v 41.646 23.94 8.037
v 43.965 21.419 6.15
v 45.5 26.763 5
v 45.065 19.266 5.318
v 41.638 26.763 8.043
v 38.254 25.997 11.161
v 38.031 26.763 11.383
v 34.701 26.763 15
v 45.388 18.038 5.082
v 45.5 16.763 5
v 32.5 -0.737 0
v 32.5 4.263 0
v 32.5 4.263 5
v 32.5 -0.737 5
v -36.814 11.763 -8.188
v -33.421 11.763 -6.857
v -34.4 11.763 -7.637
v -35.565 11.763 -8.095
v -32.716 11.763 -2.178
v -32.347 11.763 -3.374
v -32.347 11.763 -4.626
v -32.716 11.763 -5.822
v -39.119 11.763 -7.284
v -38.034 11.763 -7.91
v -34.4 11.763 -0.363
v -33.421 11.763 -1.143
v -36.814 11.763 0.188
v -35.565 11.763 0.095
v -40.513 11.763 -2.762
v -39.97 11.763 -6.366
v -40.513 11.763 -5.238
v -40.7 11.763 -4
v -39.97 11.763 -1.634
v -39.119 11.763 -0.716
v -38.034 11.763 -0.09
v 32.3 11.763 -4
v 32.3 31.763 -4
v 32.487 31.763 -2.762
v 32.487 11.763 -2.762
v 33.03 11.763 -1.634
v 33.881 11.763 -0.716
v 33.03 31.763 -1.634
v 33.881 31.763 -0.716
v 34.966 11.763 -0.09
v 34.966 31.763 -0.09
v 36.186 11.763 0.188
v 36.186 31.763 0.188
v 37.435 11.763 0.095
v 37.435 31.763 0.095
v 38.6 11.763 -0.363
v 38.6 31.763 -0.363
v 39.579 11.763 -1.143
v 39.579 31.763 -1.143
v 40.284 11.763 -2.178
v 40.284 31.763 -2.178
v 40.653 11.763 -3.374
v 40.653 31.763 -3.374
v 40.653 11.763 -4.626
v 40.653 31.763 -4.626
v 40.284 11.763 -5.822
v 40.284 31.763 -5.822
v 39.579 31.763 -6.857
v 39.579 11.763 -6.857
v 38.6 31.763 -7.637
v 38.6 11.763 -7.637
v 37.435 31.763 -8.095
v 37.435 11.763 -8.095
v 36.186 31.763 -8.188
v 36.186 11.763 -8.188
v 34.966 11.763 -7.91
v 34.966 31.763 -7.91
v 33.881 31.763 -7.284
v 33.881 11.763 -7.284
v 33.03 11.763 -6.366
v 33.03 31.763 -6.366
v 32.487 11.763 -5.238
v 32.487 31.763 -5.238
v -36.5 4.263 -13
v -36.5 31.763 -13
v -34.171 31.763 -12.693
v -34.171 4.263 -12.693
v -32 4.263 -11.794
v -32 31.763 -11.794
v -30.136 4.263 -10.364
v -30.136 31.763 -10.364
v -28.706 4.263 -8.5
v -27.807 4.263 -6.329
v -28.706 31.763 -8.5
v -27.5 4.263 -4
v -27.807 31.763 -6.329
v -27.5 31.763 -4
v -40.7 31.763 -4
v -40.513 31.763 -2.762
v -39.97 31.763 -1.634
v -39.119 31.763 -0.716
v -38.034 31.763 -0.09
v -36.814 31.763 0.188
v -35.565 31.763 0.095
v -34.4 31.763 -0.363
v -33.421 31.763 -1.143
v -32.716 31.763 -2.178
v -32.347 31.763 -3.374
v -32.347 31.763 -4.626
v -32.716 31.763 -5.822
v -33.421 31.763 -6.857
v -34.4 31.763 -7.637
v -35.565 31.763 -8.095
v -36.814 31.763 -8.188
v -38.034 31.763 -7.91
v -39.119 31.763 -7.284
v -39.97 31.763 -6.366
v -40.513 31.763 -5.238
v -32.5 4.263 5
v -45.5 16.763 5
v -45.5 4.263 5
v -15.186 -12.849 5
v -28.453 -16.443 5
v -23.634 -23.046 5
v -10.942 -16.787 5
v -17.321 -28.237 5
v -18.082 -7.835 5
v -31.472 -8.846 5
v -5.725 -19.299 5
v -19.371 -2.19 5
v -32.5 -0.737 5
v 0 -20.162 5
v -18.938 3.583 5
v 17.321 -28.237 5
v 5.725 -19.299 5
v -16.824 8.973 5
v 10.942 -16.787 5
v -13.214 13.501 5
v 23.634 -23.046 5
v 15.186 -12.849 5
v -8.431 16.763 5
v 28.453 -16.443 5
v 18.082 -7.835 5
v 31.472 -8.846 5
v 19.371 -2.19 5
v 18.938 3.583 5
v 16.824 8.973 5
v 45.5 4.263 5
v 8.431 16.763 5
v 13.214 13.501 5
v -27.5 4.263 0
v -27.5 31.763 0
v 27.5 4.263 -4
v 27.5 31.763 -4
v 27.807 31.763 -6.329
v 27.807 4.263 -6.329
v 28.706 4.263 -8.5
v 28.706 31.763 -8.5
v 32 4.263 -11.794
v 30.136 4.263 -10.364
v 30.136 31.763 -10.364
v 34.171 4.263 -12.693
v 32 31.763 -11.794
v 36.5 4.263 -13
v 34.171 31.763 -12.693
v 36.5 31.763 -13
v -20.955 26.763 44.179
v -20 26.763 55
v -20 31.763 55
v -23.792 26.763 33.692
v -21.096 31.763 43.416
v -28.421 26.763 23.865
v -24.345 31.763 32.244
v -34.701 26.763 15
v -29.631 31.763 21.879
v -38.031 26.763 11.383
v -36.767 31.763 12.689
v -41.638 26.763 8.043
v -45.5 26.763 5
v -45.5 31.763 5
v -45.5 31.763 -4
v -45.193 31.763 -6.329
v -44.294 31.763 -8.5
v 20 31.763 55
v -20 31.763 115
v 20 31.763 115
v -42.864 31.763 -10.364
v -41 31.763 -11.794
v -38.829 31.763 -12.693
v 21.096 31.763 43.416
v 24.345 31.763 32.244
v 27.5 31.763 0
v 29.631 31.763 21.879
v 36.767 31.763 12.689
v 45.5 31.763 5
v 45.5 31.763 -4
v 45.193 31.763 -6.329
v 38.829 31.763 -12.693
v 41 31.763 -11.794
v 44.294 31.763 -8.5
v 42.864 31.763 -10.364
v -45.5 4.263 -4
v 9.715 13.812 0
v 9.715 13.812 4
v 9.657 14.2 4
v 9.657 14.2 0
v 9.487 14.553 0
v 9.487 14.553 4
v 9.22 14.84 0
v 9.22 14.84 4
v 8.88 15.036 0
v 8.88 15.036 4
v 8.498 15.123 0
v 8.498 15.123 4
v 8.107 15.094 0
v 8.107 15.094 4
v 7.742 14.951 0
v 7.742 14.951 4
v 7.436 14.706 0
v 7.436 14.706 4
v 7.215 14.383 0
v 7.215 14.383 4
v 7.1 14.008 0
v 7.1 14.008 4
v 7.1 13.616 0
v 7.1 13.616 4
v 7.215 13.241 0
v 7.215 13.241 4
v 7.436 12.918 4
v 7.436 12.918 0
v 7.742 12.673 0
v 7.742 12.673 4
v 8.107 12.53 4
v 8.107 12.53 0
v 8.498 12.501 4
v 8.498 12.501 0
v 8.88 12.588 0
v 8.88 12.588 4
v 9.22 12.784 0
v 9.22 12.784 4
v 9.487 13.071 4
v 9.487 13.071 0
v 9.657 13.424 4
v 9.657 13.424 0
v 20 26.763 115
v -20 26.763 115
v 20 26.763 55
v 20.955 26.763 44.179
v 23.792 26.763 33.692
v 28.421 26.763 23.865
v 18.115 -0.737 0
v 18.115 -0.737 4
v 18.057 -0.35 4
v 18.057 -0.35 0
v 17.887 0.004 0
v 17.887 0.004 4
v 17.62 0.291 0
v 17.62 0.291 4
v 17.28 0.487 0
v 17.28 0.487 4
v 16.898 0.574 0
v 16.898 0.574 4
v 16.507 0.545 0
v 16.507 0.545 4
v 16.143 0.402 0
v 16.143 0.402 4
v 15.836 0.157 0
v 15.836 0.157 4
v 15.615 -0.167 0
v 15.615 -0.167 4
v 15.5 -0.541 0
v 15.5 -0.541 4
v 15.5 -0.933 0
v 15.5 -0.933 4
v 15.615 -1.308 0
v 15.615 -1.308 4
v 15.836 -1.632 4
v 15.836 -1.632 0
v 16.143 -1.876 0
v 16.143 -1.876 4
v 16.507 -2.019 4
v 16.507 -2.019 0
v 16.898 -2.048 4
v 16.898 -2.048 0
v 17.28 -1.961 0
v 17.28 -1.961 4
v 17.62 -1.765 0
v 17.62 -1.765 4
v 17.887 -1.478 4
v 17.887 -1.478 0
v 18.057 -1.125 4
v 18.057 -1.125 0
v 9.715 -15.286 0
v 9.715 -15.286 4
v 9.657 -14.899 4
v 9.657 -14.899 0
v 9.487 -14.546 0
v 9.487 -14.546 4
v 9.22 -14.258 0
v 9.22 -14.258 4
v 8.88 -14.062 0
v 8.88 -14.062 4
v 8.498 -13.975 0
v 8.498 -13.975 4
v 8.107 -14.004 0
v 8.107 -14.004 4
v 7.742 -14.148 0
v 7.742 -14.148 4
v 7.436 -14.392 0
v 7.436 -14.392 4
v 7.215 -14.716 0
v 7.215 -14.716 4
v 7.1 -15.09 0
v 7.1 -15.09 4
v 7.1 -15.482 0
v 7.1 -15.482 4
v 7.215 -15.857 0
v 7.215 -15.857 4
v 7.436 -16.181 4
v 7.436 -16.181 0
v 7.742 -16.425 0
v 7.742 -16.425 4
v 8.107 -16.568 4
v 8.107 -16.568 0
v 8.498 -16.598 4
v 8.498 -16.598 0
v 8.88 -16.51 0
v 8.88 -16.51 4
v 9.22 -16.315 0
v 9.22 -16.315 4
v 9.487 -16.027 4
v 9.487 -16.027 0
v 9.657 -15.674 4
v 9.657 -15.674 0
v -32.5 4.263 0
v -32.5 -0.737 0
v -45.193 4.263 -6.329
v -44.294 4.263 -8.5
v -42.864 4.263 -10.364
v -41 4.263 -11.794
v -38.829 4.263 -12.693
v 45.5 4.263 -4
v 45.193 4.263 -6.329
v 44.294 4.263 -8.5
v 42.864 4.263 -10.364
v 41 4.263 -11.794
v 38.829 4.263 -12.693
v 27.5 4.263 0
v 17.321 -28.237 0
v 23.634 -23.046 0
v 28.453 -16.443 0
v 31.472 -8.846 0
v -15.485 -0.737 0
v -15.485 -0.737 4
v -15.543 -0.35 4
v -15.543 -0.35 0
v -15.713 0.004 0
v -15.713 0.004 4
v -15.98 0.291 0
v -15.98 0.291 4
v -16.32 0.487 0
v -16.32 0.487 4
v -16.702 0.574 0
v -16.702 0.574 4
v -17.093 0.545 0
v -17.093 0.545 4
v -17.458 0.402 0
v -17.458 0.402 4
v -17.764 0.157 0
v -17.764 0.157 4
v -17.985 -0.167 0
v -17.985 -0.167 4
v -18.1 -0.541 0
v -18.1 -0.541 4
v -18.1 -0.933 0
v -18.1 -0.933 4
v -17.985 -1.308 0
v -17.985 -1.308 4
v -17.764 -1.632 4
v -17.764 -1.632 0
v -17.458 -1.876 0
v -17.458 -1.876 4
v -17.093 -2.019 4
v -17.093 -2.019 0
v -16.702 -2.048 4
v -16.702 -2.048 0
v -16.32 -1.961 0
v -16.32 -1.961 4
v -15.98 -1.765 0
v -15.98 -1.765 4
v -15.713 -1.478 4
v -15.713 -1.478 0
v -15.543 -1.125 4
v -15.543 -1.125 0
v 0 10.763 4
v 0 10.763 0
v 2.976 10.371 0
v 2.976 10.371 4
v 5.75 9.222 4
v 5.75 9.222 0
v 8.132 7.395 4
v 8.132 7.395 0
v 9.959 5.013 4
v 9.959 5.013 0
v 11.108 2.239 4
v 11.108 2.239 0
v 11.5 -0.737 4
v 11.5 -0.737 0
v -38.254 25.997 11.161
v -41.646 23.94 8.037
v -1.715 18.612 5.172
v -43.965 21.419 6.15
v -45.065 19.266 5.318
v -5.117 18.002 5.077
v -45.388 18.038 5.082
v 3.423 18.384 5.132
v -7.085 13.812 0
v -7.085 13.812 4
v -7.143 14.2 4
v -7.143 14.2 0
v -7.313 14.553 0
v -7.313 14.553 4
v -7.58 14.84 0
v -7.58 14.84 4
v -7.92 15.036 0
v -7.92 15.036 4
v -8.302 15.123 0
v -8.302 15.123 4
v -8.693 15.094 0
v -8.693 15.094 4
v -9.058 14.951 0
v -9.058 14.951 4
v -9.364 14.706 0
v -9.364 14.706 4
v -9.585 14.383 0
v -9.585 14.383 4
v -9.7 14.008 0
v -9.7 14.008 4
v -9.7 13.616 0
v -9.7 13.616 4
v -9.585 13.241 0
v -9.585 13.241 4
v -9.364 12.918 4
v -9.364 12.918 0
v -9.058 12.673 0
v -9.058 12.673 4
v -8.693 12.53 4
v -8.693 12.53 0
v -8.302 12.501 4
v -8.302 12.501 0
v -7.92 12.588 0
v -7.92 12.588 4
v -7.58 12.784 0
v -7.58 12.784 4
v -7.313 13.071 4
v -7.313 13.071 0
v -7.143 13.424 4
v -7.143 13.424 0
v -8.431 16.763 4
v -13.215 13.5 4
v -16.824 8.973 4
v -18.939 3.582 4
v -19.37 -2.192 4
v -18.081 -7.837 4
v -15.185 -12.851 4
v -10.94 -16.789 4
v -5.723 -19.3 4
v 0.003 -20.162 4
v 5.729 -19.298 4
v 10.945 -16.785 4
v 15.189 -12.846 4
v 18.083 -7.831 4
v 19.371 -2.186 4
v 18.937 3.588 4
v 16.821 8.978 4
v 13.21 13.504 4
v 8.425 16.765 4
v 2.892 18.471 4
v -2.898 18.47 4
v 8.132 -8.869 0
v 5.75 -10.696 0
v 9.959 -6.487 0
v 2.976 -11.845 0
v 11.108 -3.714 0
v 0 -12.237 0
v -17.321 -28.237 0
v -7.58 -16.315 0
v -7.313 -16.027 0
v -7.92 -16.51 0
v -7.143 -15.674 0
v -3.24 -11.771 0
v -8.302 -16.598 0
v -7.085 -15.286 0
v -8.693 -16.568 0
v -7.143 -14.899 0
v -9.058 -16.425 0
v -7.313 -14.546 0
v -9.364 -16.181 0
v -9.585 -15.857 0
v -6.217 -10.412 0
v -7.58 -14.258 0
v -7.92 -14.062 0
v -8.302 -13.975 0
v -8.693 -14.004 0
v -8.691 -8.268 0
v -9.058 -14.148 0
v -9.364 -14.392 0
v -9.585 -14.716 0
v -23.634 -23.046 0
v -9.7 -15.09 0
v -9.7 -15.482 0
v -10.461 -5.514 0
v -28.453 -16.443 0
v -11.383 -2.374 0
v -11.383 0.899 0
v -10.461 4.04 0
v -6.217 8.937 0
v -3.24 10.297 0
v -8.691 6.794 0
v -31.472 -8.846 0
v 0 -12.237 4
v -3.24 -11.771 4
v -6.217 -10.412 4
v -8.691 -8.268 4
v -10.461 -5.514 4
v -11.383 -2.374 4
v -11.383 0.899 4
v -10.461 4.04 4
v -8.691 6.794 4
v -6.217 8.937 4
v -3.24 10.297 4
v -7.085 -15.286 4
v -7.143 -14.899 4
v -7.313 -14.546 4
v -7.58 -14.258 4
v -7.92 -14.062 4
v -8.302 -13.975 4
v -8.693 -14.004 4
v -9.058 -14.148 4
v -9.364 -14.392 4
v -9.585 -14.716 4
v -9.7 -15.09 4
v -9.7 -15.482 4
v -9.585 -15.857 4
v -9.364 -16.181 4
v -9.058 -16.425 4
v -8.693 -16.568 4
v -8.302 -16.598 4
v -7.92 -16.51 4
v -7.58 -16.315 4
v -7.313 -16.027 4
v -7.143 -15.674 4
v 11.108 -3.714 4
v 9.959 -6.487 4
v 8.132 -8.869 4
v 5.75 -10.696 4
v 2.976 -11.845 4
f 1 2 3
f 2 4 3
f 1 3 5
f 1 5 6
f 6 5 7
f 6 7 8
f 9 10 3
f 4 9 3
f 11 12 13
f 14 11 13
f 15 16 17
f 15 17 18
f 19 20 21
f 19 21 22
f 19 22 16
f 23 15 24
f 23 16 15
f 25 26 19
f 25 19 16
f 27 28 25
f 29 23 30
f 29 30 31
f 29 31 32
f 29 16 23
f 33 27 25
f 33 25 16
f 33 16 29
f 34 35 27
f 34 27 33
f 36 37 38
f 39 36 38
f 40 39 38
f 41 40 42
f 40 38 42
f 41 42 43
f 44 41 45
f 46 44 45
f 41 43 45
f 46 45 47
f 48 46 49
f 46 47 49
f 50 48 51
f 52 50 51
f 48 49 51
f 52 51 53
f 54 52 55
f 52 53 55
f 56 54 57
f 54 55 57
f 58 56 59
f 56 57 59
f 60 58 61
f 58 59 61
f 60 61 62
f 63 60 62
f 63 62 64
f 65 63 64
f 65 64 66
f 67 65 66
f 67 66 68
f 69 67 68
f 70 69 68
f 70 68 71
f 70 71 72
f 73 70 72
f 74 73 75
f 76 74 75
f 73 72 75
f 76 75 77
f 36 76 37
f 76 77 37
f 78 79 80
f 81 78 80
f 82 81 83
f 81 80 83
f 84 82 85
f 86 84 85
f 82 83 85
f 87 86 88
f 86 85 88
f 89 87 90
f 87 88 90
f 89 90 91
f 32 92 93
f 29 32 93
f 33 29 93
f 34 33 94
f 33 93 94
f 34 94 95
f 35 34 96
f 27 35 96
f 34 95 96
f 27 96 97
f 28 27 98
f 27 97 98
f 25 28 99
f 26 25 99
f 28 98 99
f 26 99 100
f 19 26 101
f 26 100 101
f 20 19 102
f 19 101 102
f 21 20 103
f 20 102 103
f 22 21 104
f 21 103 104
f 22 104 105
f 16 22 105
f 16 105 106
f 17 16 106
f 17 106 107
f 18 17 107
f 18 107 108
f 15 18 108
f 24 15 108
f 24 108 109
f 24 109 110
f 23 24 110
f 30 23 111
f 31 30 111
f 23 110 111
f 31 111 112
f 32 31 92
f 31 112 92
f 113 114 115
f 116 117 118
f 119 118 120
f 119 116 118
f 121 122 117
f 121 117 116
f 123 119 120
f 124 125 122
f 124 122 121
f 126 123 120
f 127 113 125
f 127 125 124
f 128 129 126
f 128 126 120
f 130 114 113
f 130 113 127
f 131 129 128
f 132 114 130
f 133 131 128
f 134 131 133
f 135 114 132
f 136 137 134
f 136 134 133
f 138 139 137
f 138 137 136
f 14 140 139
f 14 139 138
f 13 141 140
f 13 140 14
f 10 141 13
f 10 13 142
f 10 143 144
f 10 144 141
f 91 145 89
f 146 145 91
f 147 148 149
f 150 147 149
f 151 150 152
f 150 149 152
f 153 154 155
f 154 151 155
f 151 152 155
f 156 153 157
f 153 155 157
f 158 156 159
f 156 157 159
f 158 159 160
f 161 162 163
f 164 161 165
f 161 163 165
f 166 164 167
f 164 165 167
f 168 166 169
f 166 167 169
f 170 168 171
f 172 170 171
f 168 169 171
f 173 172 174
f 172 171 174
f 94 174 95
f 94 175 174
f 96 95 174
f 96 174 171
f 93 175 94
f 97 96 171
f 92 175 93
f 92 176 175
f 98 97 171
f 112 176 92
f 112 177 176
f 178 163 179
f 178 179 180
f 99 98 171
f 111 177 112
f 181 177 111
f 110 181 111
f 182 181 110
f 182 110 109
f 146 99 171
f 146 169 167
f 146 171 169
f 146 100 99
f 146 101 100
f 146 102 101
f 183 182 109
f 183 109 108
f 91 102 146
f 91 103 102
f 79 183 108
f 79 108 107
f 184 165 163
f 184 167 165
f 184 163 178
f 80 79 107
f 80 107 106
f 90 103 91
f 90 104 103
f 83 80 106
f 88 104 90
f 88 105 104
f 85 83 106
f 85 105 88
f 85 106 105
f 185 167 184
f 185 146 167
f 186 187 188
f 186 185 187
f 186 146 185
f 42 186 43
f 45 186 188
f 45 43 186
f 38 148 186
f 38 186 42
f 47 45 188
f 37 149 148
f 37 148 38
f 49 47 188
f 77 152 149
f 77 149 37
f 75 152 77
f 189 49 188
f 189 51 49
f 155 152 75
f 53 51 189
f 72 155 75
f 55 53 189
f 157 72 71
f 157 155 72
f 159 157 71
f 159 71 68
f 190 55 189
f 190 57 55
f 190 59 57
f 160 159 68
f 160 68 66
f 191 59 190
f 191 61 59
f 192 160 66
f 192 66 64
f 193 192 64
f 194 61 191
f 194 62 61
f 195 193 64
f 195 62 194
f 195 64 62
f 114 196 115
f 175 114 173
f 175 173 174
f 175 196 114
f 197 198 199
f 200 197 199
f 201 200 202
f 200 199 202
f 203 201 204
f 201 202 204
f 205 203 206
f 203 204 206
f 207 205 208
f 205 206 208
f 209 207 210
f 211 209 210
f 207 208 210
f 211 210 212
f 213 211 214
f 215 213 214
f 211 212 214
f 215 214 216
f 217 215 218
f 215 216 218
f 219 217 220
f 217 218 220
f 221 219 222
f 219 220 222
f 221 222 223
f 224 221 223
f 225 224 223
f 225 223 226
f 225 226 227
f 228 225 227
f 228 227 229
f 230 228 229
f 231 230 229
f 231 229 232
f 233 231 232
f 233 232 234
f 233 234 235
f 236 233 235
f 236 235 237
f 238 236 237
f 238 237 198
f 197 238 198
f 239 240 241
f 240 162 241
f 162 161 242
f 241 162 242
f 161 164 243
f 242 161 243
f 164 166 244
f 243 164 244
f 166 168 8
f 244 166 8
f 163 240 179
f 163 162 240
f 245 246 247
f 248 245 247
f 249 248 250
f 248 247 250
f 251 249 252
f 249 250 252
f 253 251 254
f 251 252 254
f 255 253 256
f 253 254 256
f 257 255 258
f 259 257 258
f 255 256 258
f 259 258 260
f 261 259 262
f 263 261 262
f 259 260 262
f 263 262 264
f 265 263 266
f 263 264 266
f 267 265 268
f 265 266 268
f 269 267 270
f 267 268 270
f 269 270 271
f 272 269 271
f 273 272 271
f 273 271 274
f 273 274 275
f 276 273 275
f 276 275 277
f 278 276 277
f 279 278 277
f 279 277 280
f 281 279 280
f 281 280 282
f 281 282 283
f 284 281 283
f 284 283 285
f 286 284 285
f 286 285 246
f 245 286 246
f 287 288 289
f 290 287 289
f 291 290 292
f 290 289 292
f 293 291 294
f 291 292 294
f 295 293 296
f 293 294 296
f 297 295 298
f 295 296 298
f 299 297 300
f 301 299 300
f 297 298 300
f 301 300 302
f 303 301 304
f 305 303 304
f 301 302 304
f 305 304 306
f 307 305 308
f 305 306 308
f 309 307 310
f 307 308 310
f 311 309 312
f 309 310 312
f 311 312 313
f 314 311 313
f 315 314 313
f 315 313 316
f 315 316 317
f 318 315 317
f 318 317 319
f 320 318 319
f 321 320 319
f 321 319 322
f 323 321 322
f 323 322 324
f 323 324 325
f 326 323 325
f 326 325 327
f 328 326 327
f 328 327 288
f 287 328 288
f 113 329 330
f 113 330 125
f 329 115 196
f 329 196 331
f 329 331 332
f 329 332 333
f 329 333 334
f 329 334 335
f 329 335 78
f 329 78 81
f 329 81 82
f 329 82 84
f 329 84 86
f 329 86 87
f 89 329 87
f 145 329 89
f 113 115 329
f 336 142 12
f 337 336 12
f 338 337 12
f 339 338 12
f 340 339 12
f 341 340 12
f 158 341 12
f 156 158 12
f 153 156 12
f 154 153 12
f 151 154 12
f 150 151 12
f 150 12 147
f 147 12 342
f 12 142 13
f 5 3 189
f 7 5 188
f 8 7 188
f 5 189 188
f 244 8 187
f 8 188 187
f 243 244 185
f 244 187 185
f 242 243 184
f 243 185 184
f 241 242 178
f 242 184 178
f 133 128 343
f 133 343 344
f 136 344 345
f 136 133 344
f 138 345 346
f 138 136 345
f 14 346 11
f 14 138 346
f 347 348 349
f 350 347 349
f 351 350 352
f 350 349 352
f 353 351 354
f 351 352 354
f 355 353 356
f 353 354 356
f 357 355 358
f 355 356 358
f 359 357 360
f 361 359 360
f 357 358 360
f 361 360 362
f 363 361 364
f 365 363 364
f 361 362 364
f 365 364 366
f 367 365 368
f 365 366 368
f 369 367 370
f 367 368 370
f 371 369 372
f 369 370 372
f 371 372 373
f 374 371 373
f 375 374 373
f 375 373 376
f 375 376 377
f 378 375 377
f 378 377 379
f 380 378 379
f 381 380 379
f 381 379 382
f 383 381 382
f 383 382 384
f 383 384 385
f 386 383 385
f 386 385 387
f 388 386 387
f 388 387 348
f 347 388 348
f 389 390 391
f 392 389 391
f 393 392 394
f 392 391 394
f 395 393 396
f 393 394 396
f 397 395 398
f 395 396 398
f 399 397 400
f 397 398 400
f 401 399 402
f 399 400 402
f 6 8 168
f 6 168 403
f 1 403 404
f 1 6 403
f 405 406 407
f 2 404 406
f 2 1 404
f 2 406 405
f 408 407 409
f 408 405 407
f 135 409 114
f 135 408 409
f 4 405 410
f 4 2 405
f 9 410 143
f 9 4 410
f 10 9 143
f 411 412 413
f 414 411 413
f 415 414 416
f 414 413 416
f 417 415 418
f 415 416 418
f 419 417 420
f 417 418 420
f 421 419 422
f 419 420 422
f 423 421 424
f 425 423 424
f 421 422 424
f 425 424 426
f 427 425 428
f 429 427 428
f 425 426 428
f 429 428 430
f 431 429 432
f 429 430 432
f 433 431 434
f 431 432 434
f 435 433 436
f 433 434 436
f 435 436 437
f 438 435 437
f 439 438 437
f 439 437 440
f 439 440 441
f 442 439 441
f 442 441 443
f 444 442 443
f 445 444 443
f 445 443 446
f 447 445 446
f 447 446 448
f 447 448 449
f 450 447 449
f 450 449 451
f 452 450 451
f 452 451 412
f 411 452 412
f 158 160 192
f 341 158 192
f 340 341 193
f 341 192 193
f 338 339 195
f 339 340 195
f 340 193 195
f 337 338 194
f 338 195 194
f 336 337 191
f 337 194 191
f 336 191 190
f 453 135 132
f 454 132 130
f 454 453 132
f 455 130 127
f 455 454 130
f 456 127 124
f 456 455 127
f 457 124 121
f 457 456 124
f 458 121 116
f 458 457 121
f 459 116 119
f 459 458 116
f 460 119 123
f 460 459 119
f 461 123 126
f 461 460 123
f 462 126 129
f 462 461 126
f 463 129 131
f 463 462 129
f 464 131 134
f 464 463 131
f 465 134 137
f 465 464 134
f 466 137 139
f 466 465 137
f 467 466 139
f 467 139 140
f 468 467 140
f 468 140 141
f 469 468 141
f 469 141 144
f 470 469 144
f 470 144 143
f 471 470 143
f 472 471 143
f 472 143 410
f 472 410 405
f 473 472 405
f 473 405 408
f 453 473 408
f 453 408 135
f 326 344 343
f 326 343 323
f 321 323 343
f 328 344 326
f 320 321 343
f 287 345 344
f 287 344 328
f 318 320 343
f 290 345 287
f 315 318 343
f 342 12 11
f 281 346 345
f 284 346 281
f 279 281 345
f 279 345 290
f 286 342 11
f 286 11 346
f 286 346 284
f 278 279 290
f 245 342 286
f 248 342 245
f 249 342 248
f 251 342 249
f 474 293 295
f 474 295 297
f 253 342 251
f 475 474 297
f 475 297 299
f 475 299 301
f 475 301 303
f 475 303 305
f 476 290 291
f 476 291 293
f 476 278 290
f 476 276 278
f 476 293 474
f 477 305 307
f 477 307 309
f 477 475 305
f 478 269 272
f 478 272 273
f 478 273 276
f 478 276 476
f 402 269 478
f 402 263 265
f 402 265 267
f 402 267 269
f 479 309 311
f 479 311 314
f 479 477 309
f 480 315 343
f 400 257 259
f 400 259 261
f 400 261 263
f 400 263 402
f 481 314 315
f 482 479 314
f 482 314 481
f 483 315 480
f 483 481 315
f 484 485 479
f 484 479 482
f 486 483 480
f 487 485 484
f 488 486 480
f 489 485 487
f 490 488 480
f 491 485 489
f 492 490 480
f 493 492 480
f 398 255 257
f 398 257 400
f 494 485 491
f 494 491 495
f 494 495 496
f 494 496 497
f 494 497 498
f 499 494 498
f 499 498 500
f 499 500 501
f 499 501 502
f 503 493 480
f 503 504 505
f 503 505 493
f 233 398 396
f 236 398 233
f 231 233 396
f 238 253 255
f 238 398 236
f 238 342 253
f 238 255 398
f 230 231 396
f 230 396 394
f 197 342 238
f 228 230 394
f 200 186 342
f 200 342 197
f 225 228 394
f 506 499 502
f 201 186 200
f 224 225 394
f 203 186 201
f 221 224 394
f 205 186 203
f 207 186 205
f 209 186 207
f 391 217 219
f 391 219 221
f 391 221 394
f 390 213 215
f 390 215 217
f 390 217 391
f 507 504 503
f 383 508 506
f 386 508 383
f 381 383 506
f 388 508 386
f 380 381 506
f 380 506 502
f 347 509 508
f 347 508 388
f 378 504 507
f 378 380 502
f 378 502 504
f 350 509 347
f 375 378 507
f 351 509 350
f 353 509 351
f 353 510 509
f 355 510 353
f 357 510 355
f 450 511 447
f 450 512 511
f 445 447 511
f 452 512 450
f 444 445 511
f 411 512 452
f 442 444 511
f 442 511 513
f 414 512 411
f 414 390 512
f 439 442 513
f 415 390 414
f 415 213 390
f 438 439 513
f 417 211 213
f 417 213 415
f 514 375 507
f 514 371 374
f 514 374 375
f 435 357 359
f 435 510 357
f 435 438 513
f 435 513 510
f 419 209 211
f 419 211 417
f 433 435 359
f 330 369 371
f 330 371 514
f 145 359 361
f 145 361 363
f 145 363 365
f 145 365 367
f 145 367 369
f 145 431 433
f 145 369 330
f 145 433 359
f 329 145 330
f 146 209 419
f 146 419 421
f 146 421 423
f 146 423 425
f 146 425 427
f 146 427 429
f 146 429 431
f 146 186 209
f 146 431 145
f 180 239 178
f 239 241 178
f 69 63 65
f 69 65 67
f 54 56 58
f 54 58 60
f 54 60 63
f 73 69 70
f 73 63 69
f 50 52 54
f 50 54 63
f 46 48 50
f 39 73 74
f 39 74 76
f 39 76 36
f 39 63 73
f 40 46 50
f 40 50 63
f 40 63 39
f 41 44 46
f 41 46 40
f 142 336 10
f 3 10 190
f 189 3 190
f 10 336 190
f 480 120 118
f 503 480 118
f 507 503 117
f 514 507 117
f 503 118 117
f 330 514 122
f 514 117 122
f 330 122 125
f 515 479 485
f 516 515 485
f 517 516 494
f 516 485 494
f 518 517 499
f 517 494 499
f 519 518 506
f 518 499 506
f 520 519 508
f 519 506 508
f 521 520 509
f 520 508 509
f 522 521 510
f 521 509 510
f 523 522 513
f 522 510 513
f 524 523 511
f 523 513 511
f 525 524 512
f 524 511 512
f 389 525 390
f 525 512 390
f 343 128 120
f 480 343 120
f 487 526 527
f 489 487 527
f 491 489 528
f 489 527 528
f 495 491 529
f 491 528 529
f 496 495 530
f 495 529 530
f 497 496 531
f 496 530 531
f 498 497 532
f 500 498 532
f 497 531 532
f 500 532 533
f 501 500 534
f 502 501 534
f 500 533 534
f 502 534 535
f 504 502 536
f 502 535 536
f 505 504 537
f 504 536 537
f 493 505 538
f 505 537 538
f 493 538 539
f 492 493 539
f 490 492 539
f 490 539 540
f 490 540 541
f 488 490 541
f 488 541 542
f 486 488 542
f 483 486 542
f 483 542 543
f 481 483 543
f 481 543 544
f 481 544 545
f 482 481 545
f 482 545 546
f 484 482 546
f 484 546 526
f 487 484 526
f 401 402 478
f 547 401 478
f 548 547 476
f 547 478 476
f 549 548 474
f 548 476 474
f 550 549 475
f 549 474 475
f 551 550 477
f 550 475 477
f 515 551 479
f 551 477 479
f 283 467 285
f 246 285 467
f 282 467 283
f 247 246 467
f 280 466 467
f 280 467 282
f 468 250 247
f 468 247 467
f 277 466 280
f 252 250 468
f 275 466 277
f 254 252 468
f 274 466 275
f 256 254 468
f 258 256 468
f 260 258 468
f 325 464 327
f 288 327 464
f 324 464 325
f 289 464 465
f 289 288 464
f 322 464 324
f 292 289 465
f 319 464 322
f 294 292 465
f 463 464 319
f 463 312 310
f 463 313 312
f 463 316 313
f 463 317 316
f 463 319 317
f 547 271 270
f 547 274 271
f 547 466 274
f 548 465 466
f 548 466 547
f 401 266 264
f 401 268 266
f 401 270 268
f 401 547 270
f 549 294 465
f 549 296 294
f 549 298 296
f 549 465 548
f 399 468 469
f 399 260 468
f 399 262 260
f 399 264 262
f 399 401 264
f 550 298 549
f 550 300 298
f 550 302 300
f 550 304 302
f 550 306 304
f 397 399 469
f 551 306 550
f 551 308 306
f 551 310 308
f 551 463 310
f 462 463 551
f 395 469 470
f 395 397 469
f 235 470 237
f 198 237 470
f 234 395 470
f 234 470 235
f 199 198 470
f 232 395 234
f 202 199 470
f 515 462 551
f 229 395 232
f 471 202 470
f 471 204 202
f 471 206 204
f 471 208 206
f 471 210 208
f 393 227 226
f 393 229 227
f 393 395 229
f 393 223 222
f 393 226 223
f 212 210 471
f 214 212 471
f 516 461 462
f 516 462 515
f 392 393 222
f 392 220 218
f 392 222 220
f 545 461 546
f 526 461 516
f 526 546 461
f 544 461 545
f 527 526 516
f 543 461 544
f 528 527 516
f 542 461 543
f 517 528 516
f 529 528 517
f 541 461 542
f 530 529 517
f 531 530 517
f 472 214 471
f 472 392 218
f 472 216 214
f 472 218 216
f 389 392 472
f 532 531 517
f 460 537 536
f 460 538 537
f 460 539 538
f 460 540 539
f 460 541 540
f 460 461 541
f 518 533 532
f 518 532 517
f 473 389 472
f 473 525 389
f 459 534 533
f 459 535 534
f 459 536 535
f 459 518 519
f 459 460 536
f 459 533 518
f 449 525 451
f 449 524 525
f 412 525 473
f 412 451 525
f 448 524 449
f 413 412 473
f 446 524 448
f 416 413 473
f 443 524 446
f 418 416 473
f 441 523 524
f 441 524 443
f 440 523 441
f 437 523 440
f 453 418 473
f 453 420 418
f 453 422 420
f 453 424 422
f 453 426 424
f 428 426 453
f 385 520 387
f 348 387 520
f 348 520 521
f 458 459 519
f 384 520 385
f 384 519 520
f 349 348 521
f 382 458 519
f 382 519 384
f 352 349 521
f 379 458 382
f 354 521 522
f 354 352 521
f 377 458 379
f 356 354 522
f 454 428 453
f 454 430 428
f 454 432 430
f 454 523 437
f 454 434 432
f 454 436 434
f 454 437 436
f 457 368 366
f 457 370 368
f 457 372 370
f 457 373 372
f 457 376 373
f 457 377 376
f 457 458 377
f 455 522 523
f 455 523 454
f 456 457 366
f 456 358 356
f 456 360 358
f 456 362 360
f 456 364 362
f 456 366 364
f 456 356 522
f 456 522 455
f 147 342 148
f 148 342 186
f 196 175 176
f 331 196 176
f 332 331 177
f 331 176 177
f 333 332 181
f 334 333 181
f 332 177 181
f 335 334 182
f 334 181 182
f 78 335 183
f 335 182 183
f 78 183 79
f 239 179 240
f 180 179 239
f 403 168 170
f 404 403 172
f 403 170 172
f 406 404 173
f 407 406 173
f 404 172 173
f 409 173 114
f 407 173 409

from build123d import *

# Parameters (mm, degrees)
SKETCH1_W                = 9
SKETCH1_H                = 55
SKETCH1_W_2              = 91
SKETCH1_H_2              = 5
BOSS_EXTRUDE3_DEPTH      = 5
SKETCH6_W                = 18
SKETCH6_H                = 60
BOSS_EXTRUDE4_DEPTH      = 18
SKETCH7_W                = 91
SKETCH7_H                = 5
BOSS_EXTRUDE5_DEPTH      = 100
SKETCH13_W               = 18
SKETCH13_H               = 5
CUT_EXTRUDE6_DEPTH       = 75
SKETCH16_R               = 4.2
CUT_EXTRUDE7_DEPTH       = 20
CUT_EXTRUDE8_DEPTH       = 75
CUT_EXTRUDE10_DEPTH      = 8
CUT_EXTRUDE11_DEPTH      = 22
CUT_EXTRUDE14_DEPTH      = 34
CUT_EXTRUDE14_DEPTH_BACK = 5
FILLET4_R                = 10
CUT_EXTRUDE15_DEPTH      = 24
CUT_EXTRUDE15_DEPTH_BACK = 1
SKETCH23_R               = 19.425
SKETCH24_R               = 1.315
CUT_EXTRUDE16_DEPTH      = 10
SKETCH26_W               = 40
SKETCH26_H               = 5
BOSS_EXTRUDE6_DEPTH      = 10


with BuildPart() as part:
    # Sketch1 → Boss-Extrude3 (new body)
    with BuildSketch(Plane.XY):
        with Locations((41, -0.737170899)):
            Rectangle(SKETCH1_W, SKETCH1_H)
        with Locations((32, -0.737170899)):
            Rectangle(SKETCH1_W, SKETCH1_H)
        with BuildLine():
            Line((27.5, 26.762829101), (0, 26.762829101))
            Line((0, 26.762829101), (0, 10.762829101))
            ThreePointArc((0, 10.762829101), (8.131727984, 7.394557085), (11.5, -0.737170899))
            ThreePointArc((11.5, -0.737170899), (8.131727984, -8.868898883), (0, -12.237170899))
            Line((0, -12.237170899), (0, -28.237170899))
            Line((0, -28.237170899), (27.5, -28.237170899))
            Line((27.5, -28.237170899), (27.5, 26.762829101))
        make_face()
        with BuildLine():
            Line((0, 10.762829101), (0, 26.762829101))
            Line((0, 26.762829101), (-27.5, 26.762829101))
            Line((-27.5, 26.762829101), (-27.5, -28.237170899))
            Line((-27.5, -28.237170899), (0, -28.237170899))
            Line((0, -28.237170899), (0, -12.237170899))
            ThreePointArc((0, -12.237170899), (-11.5, -0.737170899), (0, 10.762829101))
        make_face()
        with Locations((-32, -0.737170899)):
            Rectangle(SKETCH1_W, SKETCH1_H)
        with Locations((-41, -0.737170899)):
            Rectangle(SKETCH1_W, SKETCH1_H)
        with Locations((0, 29.262829101)):
            Rectangle(SKETCH1_W_2, SKETCH1_H_2)
    extrude(amount=BOSS_EXTRUDE3_DEPTH)

    # Sketch6 → Boss-Extrude4 (add)
    with BuildSketch(Plane(origin=(0, 0, 0), x_dir=(-1, 0, 0), z_dir=(0, 0, -1))):
        with Locations((-36.5, 1.762829101)):
            Rectangle(SKETCH6_W, SKETCH6_H)
        with Locations((36.5, 1.762829101)):
            Rectangle(SKETCH6_W, SKETCH6_H)
    extrude(amount=BOSS_EXTRUDE4_DEPTH)

    # Sketch7 → Boss-Extrude5 (add)
    with BuildSketch(Plane.XY.offset(5)):
        with Locations((0, 29.262829101)):
            Rectangle(SKETCH7_W, SKETCH7_H)
    extrude(amount=BOSS_EXTRUDE5_DEPTH)

    # Sketch13 → Cut-Extrude6 (cut)
    with BuildSketch(Plane(origin=(0, 31.762829101, 0), x_dir=(1, 0, 0), z_dir=(0, 1, 0))):
        with Locations((-36.5, 15.5)):
            Rectangle(SKETCH13_W, SKETCH13_H)
        with Locations((36.5, 15.5)):
            Rectangle(SKETCH13_W, SKETCH13_H)
    extrude(amount=-CUT_EXTRUDE6_DEPTH, mode=Mode.SUBTRACT)

    # Sketch16 → Cut-Extrude7 (cut)
    with BuildSketch(Plane(origin=(0, 31.762829101, 0), x_dir=(1, 0, 0), z_dir=(0, 1, 0))):
        with Locations(Location((-36.5, 4, 0), (0, 0, 180))):
            Circle(SKETCH16_R)
        with Locations(Location((36.5, 4, 0), (0, 0, 180))):
            Circle(SKETCH16_R)
    extrude(amount=-CUT_EXTRUDE7_DEPTH, mode=Mode.SUBTRACT)

    # Sketch17 → Cut-Extrude8 (cut)
    with BuildSketch(Plane(origin=(0, 31.762829101, 0), x_dir=(1, 0, 0), z_dir=(0, 1, 0))):
        with BuildLine():
            Line((-45.5, 13), (-45.5, 4))
            ThreePointArc((-45.5, 4), (-42.863961031, 10.363961031), (-36.5, 13))
            Line((-36.5, 13), (-45.5, 13))
        make_face()
        with BuildLine():
            ThreePointArc((-36.5, 13), (-30.136038969, 10.363961031), (-27.5, 4))
            Line((-27.5, 4), (-27.5, 13))
            Line((-27.5, 13), (-36.5, 13))
        make_face()
        with BuildLine():
            Line((27.5, 13), (27.5, 4))
            ThreePointArc((27.5, 4), (30.136038969, 10.363961031), (36.5, 13))
            Line((36.5, 13), (27.5, 13))
        make_face()
        with BuildLine():
            Line((45.5, 13), (36.5, 13))
            ThreePointArc((36.5, 13), (42.863961031, 10.363961031), (45.5, 4))
            Line((45.5, 4), (45.5, 13))
        make_face()
    extrude(amount=-CUT_EXTRUDE8_DEPTH, mode=Mode.SUBTRACT)

    # Sketch18 → Cut-Extrude10 (cut)
    with BuildSketch(Plane(origin=(0, 31.762829101, 0), x_dir=(1, 0, 0), z_dir=(0, 1, 0))):
        with BuildLine():
            ThreePointArc((-45.5, -105), (-26.743051045, -83.063543967), (-20, -55))
            Line((-20, -55), (-45.5, -55))
            Line((-45.5, -55), (-45.5, -105))
        make_face()
        with BuildLine():
            Line((-45.5, -55), (-20, -55))
            ThreePointArc((-20, -55), (-26.743051045, -26.936456033), (-45.5, -5))
            Line((-45.5, -5), (-45.5, -55))
        make_face()
        with BuildLine():
            ThreePointArc((-45.5, -105), (-26.743051045, -83.063543967), (-20, -55))
            Line((-20, -55), (-45.5, -55))
            Line((-45.5, -55), (-45.5, -105))
        make_face()
        with BuildLine():
            Line((-45.5, -55), (-20, -55))
            ThreePointArc((-20, -55), (-26.743051045, -26.936456033), (-45.5, -5))
            Line((-45.5, -5), (-45.5, -55))
        make_face()
        with BuildLine():
            Line((-20, -105), (-20, -55))
            ThreePointArc((-20, -55), (-26.743051045, -83.063543967), (-45.5, -105))
            Line((-45.5, -105), (-20, -105))
        make_face()
        with BuildLine():
            Line((20, -55), (20, -105))
            Line((20, -105), (45.5, -105))
            ThreePointArc((45.5, -105), (26.743051045, -83.063543967), (20, -55))
        make_face()
        with BuildLine():
            Line((45.5, -55), (45.5, -5))
            ThreePointArc((45.5, -5), (26.743051045, -26.936456033), (20, -55))
            Line((20, -55), (45.5, -55))
        make_face()
        with BuildLine():
            ThreePointArc((20, -55), (26.743051045, -83.063543967), (45.5, -105))
            Line((45.5, -105), (45.5, -55))
            Line((45.5, -55), (20, -55))
        make_face()
        with BuildLine():
            Line((45.5, -55), (45.5, -5))
            ThreePointArc((45.5, -5), (26.743051045, -26.936456033), (20, -55))
            Line((20, -55), (45.5, -55))
        make_face()
        with BuildLine():
            ThreePointArc((20, -55), (26.743051045, -83.063543967), (45.5, -105))
            Line((45.5, -105), (45.5, -55))
            Line((45.5, -55), (20, -55))
        make_face()
    extrude(amount=-CUT_EXTRUDE10_DEPTH, mode=Mode.SUBTRACT)

    # Sketch19 → Cut-Extrude11 (cut)
    with BuildSketch(Plane.XY.offset(5)):
        with BuildLine():
            Line((-32.5, -0.737170899), (-45.5, -0.737170899))
            Line((-45.5, -0.737170899), (-45.5, -28.237170899))
            Line((-45.5, -28.237170899), (-17.320508076, -28.237170899))
            ThreePointArc((-17.320508076, -28.237170899), (-28.453176558, -16.442798673), (-32.5, -0.737170899))
        make_face()
        with BuildLine():
            Line((45.5, -28.237170899), (17.320508076, -28.237170899))
            ThreePointArc((17.320508076, -28.237170899), (28.453176558, -16.442798673), (32.5, -0.737170899))
            Line((32.5, -0.737170899), (45.5, -0.737170899))
            Line((45.5, -0.737170899), (45.5, -28.237170899))
        make_face()
    extrude(amount=-CUT_EXTRUDE11_DEPTH, mode=Mode.SUBTRACT)

    # Sketch21 → Cut-Extrude14 (cut, two sides: drawn at the far end of the back side and taken through both)
    with BuildSketch(Plane.XZ.offset(0.737170899).offset(-CUT_EXTRUDE14_DEPTH_BACK)):
        with BuildLine():
            Line((27.5, 0), (32.5, 0))
            Line((32.5, 0), (32.5, 5))
            Line((32.5, 5), (45.5, 5))
            Line((45.5, 5), (45.5, -4))
            ThreePointArc((45.5, -4), (36.5, -13), (27.5, -4))
            Line((27.5, -4), (27.5, 0))
        make_face()
        with BuildLine():
            Line((-27.5, -4), (-27.5, 0))
            Line((-27.5, 0), (-32.5, 0))
            Line((-32.5, 0), (-32.5, 5))
            Line((-32.5, 5), (-45.5, 5))
            Line((-45.5, 5), (-45.5, -4))
            ThreePointArc((-45.5, -4), (-36.5, -13), (-27.5, -4))
        make_face()
    extrude(amount=CUT_EXTRUDE14_DEPTH + CUT_EXTRUDE14_DEPTH_BACK, mode=Mode.SUBTRACT)

    # Fillet4
    # the kernel refuses this fillet: 10 mm, written as the material it adds along each edge
    with BuildSketch(Plane(origin=(70.5, 26.762829101, 5), x_dir=(0, -1, 0), z_dir=(-1, 0, 0))) as fillet4_piece_1_section:
        with BuildLine():
            CenterArc((FILLET4_R, FILLET4_R), FILLET4_R, 180, 90)
            Line((0, FILLET4_R), (0, 0))
            Line((0, 0), (FILLET4_R, 0))
        make_face()
    fillet4_piece_1 = extrude(amount=141, mode=Mode.PRIVATE)
    fillet4_piece_1 = fillet4_piece_1 - Plane(origin=(-81.769607843, 24.471447362, 55), x_dir=(0.5871756209824568, 0, 0.8094595667010591), z_dir=(0, 1, 0)) * Cylinder(61.769607843, 322, mode=Mode.PRIVATE)
    fillet4_piece_1 = fillet4_piece_1 - Plane(origin=(81.769607843, 24.471447362, 55), x_dir=(-0.5871756209824566, 0, -0.8094595667010592), z_dir=(0, 1, 0)) * Cylinder(61.769607843, 322, mode=Mode.PRIVATE)
    add(fillet4_piece_1)

    # Sketch23 → Cut-Extrude15 (cut, two sides: drawn at the far end of the back side and taken through both)
    with BuildSketch(Plane.XY.offset(5).offset(-CUT_EXTRUDE15_DEPTH_BACK)):
        with Locations(Location((0, -0.737170899, 0), (0, 0, 115.723259522))):
            Circle(SKETCH23_R)
    extrude(amount=CUT_EXTRUDE15_DEPTH + CUT_EXTRUDE15_DEPTH_BACK, mode=Mode.SUBTRACT)

    # Sketch24 → Cut-Extrude16 (cut)
    with BuildSketch(Plane.XY.offset(4)):
        with Locations((-8.4, 13.812055885)):
            Circle(SKETCH24_R)
        with Locations((8.4, -15.286397682)):
            Circle(SKETCH24_R)
        with Locations((-8.4, -15.286397682)):
            Circle(SKETCH24_R)
        with Locations((16.8, -0.737170899)):
            Circle(SKETCH24_R)
        with Locations((-16.8, -0.737170899)):
            Circle(SKETCH24_R)
        with Locations((8.4, 13.812055885)):
            Circle(SKETCH24_R)
    extrude(amount=-CUT_EXTRUDE16_DEPTH, mode=Mode.SUBTRACT)

    # Sketch26 → Boss-Extrude6 (add)
    with BuildSketch(Plane.XY.offset(105)):
        with Locations((0, 29.262829101)):
            Rectangle(SKETCH26_W, SKETCH26_H)
    extrude(amount=BOSS_EXTRUDE6_DEPTH)


solid = part.part
